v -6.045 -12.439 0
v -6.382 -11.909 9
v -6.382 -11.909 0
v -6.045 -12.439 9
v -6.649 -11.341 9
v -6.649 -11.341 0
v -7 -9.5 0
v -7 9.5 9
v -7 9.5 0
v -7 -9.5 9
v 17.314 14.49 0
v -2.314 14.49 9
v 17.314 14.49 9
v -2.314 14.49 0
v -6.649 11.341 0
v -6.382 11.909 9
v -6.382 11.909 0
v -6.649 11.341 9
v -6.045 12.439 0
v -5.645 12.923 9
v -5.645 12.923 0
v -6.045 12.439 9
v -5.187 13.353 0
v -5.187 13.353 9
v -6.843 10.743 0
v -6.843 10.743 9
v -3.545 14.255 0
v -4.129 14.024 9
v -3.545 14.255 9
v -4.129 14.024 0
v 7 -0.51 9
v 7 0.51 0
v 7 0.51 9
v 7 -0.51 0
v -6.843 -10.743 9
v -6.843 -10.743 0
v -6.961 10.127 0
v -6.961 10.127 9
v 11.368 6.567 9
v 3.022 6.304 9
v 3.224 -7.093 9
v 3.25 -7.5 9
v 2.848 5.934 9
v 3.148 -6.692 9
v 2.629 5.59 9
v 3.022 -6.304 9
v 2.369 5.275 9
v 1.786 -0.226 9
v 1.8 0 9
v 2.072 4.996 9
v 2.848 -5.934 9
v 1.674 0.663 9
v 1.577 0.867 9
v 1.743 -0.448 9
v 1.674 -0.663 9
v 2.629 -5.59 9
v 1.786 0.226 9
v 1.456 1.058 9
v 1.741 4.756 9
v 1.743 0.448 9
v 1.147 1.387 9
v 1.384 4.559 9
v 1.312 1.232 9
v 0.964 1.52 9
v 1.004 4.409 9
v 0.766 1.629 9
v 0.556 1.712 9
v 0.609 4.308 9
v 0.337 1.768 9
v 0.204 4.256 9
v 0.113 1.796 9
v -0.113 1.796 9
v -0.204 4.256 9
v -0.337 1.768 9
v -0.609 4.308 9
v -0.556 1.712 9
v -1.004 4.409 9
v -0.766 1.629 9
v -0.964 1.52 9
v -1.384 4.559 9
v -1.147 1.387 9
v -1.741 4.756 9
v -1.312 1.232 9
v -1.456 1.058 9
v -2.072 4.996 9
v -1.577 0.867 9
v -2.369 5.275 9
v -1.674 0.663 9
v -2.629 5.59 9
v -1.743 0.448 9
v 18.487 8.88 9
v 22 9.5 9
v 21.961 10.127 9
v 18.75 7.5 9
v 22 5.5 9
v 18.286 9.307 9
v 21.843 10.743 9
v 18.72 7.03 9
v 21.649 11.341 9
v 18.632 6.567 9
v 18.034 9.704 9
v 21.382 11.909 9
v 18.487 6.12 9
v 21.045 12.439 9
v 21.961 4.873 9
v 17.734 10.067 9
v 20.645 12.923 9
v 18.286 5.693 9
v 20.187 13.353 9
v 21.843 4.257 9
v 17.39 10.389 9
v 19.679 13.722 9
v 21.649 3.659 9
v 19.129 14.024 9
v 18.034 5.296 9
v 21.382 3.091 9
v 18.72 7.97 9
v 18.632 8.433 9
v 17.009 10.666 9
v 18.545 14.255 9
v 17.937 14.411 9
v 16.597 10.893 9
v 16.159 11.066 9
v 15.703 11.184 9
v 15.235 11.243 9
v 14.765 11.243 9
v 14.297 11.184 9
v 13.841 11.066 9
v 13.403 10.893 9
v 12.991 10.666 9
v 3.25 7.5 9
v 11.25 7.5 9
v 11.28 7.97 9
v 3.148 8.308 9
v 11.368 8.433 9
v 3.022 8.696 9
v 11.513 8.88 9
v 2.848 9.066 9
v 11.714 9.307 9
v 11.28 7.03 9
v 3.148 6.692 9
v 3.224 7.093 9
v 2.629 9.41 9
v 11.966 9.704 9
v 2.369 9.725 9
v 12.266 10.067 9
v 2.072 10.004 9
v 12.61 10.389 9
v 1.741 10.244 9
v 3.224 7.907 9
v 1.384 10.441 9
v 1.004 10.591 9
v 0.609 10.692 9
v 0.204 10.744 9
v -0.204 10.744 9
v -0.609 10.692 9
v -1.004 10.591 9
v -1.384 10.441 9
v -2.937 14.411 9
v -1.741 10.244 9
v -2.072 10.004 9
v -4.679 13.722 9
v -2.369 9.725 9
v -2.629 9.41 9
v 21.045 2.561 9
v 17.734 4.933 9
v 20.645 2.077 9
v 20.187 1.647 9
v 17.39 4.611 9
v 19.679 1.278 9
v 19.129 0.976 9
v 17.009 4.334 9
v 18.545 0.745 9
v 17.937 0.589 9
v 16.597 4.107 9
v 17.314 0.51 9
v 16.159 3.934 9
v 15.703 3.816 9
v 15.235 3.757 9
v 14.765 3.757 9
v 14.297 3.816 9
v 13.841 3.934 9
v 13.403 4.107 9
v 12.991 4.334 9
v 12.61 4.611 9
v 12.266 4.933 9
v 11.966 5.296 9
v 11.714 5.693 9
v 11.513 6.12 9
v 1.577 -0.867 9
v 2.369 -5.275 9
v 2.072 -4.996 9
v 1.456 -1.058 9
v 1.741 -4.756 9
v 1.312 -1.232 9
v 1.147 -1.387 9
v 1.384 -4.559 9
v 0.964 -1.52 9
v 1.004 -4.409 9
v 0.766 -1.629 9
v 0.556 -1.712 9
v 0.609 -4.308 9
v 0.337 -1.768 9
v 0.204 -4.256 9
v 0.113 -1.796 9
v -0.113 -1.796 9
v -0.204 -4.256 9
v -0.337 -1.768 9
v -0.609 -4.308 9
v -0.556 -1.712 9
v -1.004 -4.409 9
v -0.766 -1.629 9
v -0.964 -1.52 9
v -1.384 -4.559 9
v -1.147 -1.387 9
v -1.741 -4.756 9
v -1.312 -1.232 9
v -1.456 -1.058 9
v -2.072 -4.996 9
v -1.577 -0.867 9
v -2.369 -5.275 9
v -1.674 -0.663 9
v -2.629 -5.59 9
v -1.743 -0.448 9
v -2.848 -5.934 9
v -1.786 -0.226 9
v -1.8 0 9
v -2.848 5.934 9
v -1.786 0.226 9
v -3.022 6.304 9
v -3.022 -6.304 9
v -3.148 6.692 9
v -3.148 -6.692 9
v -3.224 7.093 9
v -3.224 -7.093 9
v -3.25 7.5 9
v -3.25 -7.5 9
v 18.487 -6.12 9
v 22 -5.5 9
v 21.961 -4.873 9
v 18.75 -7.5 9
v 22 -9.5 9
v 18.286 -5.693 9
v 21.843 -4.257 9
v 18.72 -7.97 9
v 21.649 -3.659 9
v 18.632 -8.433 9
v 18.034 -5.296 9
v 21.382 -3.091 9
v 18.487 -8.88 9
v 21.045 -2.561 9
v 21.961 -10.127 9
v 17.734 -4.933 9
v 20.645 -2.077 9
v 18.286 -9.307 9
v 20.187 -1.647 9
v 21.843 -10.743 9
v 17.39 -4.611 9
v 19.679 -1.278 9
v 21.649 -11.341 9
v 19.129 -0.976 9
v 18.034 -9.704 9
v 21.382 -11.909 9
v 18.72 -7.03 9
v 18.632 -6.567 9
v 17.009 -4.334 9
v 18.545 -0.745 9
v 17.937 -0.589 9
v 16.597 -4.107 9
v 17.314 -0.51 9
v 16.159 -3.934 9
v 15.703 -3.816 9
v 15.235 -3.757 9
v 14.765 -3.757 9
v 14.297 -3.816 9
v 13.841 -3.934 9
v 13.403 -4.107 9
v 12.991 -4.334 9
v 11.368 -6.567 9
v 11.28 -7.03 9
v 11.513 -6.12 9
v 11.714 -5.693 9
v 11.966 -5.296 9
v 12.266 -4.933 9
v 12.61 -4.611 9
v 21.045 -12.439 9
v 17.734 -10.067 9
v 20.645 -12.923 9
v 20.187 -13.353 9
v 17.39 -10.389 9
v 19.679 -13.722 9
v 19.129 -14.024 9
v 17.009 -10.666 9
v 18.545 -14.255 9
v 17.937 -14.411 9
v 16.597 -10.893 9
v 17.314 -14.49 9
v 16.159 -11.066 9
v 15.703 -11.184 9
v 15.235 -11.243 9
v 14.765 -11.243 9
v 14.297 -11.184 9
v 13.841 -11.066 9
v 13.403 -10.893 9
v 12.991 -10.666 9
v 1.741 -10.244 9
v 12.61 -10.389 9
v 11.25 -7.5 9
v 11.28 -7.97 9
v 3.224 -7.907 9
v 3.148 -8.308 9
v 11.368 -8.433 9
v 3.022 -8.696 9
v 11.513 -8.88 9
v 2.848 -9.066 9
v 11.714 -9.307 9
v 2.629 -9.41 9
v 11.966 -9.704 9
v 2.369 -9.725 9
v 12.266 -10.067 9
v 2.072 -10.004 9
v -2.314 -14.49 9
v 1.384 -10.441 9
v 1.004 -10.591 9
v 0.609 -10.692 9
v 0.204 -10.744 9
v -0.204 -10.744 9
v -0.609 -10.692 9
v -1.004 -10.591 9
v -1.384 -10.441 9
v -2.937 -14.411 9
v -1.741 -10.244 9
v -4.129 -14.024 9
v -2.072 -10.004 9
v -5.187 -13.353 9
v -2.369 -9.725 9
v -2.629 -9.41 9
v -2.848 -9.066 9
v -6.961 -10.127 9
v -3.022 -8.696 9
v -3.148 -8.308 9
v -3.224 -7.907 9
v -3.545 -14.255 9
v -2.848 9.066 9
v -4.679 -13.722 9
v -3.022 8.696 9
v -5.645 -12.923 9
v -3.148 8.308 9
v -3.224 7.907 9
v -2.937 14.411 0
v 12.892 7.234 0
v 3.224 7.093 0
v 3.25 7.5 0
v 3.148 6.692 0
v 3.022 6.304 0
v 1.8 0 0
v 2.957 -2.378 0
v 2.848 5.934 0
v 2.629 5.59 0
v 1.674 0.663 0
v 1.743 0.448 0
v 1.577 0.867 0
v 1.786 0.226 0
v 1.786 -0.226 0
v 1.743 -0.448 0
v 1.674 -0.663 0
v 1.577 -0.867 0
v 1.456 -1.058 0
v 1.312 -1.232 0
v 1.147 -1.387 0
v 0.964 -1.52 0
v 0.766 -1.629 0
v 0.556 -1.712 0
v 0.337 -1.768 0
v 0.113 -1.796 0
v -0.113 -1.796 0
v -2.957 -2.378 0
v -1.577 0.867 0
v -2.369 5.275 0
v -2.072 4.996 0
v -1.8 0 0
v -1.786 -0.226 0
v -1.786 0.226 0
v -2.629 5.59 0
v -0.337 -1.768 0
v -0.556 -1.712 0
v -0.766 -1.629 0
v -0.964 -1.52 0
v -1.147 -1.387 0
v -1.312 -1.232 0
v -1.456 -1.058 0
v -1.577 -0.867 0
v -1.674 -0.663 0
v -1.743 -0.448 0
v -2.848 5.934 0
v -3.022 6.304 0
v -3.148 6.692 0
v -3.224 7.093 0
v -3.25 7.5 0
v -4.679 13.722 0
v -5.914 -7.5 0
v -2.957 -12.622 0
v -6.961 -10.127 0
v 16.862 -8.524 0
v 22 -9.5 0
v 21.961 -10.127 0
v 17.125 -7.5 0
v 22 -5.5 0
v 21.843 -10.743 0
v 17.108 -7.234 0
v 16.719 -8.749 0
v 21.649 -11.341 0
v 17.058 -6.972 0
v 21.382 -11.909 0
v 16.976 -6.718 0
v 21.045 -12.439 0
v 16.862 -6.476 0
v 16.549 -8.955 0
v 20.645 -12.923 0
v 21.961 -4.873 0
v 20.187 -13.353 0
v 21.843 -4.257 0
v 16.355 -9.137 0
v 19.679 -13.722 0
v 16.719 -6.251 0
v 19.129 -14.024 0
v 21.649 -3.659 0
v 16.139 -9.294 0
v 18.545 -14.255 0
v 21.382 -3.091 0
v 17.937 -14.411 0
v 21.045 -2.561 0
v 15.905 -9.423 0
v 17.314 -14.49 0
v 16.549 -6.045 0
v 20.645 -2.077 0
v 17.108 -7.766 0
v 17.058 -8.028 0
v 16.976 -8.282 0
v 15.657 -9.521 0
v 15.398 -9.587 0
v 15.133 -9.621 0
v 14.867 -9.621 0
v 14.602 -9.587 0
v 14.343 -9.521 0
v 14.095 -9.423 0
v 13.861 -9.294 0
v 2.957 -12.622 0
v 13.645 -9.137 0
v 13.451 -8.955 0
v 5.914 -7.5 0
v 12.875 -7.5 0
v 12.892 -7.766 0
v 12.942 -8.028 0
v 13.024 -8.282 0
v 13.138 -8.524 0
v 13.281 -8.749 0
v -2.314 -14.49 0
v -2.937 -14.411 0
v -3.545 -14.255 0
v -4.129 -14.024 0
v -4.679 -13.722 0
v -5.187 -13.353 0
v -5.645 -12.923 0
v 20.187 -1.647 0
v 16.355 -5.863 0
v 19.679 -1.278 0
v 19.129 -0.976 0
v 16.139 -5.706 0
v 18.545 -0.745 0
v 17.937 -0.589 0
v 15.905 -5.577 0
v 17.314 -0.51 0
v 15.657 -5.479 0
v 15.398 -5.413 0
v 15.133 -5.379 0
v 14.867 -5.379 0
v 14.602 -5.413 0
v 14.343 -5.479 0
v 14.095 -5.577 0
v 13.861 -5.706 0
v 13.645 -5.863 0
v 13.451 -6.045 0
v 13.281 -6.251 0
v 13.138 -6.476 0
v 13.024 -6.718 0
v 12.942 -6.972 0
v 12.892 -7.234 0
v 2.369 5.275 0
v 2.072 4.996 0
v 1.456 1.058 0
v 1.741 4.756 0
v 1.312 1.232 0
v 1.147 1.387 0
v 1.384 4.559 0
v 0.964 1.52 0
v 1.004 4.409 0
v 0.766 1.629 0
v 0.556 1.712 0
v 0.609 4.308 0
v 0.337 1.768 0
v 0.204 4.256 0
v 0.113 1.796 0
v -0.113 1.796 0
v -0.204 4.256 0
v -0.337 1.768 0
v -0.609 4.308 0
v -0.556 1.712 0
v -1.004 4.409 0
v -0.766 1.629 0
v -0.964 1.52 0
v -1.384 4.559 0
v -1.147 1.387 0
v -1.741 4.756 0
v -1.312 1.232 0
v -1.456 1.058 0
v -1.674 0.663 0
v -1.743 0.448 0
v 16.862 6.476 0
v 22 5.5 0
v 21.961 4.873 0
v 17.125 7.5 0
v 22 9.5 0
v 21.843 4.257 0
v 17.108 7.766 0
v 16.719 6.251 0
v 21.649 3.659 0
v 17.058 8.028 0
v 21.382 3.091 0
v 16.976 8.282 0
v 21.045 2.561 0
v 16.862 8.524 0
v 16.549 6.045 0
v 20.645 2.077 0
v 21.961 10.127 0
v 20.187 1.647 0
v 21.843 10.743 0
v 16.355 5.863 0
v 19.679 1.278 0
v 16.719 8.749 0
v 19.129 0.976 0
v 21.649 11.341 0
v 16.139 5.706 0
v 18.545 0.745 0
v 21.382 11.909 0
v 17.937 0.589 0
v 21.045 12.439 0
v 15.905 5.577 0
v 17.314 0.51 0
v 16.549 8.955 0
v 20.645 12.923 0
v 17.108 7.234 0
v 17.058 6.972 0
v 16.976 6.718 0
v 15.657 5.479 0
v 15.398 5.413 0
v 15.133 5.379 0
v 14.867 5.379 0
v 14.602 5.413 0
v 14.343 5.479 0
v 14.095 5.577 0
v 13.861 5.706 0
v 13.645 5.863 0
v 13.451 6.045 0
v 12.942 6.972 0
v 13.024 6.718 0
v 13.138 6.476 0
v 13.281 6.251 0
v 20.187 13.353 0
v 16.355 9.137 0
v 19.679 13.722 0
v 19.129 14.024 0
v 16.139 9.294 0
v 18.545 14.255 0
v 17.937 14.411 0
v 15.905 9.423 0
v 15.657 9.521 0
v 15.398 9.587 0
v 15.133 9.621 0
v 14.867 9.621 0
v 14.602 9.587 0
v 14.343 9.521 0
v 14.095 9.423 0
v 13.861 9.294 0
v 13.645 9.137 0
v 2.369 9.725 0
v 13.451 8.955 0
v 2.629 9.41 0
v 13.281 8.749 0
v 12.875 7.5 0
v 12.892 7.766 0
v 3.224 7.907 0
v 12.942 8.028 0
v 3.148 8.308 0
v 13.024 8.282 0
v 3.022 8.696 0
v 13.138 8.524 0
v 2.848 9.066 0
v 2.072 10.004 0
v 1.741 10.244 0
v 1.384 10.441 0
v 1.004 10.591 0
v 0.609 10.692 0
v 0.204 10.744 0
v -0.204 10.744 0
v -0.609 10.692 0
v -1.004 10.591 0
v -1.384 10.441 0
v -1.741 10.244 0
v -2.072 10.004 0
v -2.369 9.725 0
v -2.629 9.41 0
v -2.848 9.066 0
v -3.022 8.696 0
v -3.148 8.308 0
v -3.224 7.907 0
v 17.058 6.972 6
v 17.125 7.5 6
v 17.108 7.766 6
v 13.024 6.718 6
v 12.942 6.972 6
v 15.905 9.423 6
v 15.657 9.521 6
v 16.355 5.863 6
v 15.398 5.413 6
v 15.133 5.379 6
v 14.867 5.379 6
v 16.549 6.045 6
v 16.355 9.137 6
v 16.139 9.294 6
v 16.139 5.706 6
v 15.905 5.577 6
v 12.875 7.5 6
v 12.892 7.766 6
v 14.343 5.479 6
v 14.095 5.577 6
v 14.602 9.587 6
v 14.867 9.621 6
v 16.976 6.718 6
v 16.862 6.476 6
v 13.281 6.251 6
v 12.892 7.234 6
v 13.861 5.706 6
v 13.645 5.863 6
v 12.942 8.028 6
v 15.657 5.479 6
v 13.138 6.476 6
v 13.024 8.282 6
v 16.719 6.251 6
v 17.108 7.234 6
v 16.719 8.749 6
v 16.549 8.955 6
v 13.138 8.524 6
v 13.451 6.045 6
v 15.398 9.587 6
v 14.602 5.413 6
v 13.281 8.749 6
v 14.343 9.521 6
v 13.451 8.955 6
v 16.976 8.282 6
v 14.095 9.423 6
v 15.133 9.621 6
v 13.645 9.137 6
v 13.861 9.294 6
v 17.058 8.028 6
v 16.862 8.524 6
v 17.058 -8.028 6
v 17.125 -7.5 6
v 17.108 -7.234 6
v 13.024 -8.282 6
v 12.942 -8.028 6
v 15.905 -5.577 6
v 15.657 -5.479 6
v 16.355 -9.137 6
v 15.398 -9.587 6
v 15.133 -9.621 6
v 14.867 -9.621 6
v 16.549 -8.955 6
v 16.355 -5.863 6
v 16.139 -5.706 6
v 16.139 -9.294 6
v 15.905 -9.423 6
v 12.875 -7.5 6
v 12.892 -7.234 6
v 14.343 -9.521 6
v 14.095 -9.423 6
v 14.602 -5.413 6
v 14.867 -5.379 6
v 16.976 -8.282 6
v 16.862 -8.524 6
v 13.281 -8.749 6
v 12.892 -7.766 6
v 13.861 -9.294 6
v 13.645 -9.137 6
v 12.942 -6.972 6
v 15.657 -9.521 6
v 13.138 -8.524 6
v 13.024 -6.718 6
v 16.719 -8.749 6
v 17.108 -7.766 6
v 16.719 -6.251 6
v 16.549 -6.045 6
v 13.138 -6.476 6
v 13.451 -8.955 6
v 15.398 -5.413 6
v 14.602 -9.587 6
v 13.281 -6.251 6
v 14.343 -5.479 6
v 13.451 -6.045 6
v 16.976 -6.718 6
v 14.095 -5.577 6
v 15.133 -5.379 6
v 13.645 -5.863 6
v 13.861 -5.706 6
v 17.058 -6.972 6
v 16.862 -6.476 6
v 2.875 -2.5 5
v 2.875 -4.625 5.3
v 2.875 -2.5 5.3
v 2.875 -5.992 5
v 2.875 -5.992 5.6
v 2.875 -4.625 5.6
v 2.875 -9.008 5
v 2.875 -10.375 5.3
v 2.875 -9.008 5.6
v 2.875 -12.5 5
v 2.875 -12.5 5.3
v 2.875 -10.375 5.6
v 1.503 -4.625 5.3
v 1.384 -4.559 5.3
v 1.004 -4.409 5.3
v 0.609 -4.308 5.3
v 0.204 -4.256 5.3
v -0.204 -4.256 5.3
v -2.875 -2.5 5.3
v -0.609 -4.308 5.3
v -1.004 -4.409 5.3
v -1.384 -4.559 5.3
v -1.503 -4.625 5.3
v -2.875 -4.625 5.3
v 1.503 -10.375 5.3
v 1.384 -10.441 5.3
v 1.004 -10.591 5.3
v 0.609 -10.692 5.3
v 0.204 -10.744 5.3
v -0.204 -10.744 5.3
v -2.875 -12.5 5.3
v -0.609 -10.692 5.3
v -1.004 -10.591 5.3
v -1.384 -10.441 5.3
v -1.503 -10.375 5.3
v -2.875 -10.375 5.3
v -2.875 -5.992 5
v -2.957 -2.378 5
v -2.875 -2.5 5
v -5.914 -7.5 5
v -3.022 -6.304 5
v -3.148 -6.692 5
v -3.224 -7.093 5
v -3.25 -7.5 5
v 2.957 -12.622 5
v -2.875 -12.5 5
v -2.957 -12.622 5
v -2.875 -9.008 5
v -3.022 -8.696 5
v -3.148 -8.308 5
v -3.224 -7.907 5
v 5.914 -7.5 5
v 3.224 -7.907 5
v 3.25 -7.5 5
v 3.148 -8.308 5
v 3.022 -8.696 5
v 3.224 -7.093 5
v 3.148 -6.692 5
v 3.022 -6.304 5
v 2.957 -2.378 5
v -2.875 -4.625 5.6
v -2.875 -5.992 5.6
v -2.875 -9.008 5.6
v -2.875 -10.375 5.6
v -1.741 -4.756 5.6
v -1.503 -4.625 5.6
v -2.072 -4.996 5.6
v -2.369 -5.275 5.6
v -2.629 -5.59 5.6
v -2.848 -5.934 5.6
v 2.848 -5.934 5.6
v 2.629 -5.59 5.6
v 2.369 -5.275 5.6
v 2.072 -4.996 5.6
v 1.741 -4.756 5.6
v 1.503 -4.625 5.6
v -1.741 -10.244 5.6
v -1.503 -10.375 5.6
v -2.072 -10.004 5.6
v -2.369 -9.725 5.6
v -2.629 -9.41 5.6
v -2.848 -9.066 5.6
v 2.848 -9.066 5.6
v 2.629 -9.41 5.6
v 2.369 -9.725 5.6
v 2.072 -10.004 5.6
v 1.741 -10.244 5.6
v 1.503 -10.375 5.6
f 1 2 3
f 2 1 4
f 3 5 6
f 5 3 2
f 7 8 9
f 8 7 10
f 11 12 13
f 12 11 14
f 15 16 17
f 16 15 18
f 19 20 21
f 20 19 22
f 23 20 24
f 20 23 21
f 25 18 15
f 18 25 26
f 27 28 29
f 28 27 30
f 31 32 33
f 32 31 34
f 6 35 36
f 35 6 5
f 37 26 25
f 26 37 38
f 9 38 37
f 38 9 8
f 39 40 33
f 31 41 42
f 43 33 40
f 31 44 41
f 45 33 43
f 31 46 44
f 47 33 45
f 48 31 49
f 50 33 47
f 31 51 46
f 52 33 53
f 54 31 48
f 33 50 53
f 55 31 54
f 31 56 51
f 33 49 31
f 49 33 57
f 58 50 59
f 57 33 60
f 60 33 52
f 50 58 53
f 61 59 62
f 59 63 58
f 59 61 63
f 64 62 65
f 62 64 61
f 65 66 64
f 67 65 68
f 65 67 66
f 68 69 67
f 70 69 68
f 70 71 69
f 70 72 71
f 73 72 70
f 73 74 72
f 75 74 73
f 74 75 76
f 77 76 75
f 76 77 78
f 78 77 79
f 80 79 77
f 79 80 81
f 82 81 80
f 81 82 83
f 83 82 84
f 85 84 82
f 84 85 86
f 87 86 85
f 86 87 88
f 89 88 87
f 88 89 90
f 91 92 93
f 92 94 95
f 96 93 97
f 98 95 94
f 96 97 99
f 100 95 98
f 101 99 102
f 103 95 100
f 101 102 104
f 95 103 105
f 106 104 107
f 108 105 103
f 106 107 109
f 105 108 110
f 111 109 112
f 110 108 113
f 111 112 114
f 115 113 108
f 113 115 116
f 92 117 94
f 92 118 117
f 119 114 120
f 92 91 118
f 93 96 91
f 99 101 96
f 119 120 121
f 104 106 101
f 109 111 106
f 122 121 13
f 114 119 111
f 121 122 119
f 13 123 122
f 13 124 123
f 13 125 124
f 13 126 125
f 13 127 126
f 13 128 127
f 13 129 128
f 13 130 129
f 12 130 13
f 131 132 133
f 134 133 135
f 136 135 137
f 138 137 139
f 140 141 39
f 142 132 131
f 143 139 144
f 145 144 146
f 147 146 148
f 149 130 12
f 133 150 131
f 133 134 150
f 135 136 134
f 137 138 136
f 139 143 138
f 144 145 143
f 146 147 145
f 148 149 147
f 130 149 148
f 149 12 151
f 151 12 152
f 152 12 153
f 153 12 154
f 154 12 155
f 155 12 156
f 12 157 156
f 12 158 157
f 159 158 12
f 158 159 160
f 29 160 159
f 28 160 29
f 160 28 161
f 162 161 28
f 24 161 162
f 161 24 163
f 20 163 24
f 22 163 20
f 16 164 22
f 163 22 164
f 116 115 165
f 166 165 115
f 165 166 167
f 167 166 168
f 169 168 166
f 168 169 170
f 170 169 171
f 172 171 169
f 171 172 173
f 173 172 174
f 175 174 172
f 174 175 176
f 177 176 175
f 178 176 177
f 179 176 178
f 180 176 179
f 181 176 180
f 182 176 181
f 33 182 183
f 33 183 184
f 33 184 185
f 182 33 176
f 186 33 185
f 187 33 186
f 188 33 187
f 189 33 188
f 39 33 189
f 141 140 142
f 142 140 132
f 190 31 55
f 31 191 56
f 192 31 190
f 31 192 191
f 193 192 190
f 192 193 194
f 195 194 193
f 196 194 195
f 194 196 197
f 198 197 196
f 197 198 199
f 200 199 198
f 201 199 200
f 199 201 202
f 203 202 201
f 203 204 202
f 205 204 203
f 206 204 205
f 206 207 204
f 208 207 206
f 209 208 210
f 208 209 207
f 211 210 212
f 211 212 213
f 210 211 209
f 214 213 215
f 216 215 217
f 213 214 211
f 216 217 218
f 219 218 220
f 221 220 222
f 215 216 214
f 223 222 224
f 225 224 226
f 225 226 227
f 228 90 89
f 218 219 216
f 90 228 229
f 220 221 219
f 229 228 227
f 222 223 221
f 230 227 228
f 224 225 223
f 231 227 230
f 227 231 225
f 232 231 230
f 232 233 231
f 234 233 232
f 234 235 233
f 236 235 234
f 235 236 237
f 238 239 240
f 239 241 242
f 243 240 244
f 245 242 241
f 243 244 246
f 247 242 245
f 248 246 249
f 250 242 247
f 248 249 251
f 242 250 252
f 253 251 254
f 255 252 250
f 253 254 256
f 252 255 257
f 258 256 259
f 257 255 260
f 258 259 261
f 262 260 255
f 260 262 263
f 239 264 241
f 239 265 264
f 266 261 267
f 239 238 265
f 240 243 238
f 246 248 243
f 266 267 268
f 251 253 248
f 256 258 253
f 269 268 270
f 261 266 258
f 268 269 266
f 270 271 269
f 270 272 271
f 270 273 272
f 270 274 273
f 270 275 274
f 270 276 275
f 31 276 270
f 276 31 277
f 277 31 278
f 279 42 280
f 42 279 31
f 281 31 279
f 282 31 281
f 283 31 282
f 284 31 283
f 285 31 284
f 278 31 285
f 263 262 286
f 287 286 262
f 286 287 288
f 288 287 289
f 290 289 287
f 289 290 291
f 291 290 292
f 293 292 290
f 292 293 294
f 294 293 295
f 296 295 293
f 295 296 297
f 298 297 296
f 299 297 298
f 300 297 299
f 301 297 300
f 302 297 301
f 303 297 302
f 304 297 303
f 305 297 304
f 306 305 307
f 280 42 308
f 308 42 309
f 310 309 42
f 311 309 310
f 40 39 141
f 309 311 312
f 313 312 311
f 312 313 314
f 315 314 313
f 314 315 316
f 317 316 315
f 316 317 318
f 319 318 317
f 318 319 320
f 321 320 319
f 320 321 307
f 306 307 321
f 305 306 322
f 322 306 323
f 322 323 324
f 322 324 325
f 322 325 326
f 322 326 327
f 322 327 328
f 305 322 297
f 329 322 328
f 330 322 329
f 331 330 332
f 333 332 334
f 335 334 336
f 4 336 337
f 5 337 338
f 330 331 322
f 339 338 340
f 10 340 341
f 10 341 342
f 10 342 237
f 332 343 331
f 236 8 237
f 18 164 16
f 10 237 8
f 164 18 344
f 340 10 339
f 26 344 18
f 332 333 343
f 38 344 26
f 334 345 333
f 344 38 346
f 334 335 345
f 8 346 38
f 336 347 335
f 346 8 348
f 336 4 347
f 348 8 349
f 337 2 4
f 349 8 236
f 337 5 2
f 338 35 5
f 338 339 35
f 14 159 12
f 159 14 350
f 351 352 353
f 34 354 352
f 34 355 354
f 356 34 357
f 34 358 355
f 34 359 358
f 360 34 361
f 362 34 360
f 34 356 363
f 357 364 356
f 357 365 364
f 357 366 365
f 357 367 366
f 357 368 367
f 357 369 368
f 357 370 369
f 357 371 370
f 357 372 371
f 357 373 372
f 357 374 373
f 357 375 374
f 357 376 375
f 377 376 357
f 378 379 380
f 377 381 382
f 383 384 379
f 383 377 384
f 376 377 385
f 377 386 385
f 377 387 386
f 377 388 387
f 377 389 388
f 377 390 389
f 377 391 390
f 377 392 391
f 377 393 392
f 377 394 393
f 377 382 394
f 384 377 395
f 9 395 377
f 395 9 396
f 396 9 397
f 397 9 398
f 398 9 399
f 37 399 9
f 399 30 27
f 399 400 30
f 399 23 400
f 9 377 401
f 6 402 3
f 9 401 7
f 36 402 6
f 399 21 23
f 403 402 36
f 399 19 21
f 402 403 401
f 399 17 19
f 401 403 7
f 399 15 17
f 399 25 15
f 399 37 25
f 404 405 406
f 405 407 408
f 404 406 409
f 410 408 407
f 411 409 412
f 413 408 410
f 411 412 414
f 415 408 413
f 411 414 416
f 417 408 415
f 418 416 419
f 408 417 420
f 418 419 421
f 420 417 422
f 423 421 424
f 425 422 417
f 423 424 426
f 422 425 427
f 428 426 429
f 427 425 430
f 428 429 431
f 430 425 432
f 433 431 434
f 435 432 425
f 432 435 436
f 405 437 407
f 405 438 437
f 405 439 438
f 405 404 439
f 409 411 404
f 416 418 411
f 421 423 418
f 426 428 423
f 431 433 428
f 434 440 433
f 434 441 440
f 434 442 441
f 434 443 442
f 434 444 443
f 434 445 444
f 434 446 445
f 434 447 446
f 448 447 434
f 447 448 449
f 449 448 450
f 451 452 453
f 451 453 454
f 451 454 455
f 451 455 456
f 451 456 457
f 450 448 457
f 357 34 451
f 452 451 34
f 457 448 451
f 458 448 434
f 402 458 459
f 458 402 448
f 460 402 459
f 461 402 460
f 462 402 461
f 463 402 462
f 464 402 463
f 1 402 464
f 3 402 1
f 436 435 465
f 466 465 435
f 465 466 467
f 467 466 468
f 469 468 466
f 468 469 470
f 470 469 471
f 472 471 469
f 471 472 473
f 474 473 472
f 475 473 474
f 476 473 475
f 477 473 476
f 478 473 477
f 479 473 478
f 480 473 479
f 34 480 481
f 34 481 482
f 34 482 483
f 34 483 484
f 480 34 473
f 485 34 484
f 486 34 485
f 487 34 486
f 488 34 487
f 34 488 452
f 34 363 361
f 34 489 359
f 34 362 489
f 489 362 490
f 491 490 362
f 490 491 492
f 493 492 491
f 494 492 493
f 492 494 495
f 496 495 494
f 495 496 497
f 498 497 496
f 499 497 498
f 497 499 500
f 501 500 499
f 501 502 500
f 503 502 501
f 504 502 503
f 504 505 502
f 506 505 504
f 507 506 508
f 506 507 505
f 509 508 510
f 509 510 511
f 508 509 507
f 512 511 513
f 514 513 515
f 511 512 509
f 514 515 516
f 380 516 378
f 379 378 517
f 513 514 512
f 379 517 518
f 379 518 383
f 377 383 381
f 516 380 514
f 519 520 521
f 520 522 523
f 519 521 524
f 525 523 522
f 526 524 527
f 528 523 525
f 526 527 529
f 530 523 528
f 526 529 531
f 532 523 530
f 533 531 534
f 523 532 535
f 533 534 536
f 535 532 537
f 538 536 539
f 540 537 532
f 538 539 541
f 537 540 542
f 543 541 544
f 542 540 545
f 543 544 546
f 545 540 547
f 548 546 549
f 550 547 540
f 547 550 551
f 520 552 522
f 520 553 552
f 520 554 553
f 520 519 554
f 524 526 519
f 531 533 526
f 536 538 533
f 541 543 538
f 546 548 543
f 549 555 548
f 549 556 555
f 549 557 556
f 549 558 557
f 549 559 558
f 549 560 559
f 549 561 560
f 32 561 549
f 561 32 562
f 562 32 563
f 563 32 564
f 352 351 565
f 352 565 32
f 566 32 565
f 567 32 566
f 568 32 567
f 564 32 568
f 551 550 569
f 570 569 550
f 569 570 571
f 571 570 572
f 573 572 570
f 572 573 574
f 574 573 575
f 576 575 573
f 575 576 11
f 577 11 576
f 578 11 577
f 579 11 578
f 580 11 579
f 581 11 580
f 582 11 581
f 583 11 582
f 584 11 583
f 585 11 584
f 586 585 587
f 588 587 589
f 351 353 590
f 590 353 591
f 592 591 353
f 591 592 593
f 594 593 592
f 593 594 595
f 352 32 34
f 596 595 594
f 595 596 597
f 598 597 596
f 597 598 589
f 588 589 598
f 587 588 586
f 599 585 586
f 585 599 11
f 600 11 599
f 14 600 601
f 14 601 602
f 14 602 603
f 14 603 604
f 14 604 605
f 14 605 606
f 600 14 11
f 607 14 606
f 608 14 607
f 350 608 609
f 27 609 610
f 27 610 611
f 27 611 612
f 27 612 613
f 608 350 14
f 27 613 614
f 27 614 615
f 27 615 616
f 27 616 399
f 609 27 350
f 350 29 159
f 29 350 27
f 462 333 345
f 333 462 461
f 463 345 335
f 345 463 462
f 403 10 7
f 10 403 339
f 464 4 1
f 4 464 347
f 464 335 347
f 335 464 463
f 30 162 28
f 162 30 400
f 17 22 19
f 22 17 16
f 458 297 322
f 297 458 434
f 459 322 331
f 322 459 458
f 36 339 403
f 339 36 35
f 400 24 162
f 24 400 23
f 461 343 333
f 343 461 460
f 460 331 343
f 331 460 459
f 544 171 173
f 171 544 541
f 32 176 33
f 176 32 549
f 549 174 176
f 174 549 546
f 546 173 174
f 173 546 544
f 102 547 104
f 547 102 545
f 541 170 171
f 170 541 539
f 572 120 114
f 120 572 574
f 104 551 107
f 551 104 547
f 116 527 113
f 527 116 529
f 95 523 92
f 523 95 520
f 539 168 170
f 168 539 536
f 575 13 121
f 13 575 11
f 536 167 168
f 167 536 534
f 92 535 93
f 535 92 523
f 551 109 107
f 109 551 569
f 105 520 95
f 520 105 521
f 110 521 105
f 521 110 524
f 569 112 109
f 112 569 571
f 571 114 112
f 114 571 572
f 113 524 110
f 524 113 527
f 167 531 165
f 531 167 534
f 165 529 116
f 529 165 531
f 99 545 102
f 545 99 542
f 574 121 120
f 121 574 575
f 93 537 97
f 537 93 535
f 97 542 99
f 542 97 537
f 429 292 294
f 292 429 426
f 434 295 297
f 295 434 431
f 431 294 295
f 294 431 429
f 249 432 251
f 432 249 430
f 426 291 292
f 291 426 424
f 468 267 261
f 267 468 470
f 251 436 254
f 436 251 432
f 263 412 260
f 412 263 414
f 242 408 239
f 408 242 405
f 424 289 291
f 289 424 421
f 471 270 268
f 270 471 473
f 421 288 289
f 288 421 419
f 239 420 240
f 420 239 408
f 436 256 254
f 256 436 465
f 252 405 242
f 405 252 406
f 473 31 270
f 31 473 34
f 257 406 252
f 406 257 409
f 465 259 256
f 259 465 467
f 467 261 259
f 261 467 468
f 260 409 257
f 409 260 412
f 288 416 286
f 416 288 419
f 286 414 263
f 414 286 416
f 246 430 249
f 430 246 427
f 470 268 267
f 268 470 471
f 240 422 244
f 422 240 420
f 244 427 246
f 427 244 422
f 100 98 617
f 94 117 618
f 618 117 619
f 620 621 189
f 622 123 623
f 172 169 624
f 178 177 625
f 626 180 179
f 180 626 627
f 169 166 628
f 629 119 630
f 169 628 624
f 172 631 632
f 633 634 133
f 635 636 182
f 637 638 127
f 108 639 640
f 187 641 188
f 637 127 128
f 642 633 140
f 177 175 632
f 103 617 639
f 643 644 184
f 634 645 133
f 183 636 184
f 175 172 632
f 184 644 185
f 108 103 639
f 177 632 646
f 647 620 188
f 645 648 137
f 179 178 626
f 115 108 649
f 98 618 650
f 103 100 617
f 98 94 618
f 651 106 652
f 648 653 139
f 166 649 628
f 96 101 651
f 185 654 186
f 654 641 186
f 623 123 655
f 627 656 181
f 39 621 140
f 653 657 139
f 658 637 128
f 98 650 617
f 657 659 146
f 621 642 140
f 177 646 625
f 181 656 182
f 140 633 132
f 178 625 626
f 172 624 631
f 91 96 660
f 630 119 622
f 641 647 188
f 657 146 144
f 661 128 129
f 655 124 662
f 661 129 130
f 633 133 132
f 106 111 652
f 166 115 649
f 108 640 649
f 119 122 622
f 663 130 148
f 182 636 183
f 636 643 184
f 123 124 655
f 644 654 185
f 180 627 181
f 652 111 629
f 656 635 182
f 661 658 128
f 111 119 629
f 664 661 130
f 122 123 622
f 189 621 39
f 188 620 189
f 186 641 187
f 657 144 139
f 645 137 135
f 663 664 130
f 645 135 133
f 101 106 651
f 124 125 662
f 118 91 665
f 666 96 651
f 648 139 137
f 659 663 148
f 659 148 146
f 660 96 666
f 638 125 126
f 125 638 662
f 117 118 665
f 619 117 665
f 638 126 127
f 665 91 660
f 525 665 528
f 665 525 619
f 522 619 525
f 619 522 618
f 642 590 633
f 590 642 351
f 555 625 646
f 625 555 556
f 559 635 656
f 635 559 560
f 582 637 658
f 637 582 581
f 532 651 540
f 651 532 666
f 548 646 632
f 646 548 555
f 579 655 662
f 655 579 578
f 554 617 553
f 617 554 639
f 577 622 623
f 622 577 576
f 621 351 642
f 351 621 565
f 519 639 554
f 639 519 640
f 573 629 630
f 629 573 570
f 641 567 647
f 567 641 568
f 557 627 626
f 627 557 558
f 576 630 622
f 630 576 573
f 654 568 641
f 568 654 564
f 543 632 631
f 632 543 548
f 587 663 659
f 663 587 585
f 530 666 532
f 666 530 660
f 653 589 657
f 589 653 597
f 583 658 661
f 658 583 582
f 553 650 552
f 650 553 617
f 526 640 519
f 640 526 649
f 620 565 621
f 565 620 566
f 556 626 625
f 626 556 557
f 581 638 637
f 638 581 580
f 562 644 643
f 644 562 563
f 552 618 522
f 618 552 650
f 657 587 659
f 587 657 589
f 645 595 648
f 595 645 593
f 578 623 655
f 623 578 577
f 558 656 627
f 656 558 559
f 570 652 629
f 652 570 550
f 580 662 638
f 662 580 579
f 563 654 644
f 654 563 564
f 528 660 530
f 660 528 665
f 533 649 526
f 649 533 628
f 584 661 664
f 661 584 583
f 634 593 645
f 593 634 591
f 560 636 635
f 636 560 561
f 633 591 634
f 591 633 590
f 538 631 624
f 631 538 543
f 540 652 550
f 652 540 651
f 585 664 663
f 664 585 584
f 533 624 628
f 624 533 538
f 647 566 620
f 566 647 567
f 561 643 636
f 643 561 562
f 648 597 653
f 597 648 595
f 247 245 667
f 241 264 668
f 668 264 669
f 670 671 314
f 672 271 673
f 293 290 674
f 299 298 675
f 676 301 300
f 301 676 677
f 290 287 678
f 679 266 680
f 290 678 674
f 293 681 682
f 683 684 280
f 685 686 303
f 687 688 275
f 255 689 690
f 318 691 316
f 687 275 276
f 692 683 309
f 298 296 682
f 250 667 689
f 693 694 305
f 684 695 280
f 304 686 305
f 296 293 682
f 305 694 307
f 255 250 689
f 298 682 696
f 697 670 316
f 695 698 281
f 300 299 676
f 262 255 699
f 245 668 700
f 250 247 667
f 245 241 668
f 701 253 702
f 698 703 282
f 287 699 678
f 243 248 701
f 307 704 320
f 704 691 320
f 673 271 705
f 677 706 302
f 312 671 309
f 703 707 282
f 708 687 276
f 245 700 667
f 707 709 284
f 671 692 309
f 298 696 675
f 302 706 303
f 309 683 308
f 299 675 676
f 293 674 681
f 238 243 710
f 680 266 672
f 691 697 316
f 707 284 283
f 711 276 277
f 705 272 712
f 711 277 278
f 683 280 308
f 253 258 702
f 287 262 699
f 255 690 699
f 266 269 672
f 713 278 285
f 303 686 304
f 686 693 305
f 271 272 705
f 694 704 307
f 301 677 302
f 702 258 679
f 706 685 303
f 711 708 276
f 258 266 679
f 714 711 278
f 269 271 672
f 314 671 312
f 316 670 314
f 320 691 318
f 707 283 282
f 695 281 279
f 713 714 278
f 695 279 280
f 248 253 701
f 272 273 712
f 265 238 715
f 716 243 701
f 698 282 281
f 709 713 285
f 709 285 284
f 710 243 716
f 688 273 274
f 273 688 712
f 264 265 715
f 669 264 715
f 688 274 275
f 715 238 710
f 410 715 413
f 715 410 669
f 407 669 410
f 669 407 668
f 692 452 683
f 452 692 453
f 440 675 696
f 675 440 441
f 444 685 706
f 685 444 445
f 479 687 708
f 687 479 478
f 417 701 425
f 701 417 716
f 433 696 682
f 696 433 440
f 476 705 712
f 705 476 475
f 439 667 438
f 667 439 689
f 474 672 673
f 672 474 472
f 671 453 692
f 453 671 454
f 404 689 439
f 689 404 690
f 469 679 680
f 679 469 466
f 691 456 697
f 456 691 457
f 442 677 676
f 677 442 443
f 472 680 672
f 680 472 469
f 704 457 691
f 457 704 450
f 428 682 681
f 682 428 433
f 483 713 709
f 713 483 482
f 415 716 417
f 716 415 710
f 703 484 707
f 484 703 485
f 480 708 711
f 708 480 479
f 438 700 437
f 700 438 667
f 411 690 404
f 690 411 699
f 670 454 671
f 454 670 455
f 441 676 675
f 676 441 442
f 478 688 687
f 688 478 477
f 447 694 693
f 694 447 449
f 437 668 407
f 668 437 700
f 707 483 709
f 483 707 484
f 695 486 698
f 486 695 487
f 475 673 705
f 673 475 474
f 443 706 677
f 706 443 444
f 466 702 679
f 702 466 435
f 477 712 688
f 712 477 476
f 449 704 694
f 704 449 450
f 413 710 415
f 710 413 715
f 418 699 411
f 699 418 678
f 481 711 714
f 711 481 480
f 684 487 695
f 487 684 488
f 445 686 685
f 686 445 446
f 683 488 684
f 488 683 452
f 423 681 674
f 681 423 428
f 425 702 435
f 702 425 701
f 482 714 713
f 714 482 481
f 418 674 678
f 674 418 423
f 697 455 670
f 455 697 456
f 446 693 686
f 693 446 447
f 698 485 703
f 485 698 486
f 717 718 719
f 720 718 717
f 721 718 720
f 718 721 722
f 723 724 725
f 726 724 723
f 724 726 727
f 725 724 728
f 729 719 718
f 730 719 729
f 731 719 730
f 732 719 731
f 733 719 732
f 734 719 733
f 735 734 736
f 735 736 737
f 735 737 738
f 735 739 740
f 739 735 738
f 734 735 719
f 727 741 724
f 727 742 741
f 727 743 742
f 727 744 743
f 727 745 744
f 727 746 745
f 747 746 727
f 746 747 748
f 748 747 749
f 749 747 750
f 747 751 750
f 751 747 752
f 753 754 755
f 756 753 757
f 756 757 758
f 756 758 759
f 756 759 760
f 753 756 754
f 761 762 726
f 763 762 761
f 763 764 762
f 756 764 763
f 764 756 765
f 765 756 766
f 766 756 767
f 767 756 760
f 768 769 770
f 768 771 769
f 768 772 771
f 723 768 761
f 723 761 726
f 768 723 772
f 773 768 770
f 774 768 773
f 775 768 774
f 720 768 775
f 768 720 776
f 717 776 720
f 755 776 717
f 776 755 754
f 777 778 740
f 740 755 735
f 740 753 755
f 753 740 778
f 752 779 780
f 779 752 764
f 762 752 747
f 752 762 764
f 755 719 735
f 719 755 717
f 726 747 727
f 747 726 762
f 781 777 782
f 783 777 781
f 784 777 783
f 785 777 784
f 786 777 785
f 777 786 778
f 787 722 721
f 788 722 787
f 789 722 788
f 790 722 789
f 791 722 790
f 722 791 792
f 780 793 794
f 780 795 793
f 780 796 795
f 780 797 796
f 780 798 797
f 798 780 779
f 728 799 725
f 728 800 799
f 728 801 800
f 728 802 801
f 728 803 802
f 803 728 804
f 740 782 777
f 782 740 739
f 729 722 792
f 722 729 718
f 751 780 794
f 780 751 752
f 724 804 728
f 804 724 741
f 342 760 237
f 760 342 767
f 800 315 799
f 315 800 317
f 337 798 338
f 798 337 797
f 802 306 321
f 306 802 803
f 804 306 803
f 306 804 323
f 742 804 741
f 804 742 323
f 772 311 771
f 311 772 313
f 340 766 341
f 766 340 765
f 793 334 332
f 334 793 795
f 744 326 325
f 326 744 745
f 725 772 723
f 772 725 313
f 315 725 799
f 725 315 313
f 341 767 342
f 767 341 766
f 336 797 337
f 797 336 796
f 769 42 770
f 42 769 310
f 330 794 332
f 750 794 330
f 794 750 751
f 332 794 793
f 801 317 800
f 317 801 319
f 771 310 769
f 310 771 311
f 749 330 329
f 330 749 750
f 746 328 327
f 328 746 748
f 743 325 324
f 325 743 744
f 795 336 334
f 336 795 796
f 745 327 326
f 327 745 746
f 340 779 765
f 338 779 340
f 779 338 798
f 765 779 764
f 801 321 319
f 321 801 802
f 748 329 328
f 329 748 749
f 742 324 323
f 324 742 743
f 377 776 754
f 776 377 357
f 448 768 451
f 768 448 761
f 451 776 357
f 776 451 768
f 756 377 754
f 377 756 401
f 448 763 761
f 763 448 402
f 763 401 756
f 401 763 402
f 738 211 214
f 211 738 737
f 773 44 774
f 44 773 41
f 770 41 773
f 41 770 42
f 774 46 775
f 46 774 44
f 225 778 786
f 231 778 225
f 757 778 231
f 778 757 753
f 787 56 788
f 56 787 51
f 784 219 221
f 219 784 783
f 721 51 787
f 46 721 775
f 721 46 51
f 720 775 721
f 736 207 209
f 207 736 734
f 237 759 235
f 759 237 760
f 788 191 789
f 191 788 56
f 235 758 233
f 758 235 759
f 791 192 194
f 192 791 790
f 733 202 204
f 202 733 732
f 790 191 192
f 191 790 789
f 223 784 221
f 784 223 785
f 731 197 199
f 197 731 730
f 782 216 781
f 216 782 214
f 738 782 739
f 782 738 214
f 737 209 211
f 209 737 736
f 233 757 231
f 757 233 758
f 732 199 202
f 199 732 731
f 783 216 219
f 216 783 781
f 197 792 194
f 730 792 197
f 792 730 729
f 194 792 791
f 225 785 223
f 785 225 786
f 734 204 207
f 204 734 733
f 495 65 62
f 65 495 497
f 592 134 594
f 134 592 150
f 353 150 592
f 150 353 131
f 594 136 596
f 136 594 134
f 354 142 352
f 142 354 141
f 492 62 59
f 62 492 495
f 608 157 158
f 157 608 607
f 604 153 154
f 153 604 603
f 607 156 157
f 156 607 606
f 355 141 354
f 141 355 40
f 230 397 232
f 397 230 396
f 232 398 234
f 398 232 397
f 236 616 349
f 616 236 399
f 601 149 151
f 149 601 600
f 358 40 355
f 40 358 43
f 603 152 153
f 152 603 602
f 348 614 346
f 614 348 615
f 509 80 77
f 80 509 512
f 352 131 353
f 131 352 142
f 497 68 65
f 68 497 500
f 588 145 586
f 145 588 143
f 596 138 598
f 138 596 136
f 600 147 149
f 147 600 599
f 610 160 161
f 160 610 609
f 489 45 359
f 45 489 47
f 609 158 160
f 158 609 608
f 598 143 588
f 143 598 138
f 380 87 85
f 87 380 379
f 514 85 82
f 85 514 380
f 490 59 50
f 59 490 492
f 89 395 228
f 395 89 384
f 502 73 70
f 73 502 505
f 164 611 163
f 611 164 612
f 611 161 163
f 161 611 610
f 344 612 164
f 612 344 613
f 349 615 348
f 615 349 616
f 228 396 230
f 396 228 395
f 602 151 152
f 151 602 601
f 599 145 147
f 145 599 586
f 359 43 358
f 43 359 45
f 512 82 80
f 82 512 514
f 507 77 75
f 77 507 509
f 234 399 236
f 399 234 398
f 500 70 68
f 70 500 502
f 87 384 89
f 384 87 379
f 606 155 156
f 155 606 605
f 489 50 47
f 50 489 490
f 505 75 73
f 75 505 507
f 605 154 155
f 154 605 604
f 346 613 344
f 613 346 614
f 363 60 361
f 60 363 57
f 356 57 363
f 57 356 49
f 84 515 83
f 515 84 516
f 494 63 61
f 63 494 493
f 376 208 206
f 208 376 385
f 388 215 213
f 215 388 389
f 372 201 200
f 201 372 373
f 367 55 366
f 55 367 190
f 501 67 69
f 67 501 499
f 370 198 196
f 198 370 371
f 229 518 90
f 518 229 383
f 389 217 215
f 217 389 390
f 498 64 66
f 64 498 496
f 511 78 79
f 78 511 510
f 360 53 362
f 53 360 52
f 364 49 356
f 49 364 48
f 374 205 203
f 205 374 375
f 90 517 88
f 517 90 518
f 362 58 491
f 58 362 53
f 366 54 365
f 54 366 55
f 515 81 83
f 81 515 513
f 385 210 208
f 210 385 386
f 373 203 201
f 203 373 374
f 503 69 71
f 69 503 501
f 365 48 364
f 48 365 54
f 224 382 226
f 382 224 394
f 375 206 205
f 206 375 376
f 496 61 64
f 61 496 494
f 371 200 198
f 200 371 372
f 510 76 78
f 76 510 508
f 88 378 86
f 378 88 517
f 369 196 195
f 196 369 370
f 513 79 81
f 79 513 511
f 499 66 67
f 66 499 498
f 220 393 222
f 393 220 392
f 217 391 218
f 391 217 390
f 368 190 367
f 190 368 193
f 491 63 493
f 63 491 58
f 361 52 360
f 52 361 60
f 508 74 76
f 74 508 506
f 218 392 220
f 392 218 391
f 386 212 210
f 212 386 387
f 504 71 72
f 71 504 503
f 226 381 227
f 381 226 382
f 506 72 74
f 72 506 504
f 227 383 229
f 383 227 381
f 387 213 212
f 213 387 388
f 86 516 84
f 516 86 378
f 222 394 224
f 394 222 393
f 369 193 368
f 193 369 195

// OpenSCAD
$fn = 50;


difference() {
	union() {
		hull() {
			translate(v = [-2.0000000000, 9.5000000000, 0]) {
				cylinder(h = 9, r = 5);
			}
			translate(v = [2.0000000000, 9.5000000000, 0]) {
				cylinder(h = 9, r = 5);
			}
			translate(v = [-2.0000000000, -9.5000000000, 0]) {
				cylinder(h = 9, r = 5);
			}
			translate(v = [2.0000000000, -9.5000000000, 0]) {
				cylinder(h = 9, r = 5);
			}
		}
		translate(v = [7.5000000000, 7.5000000000, 0]) {
			hull() {
				translate(v = [-9.5000000000, 2.0000000000, 0]) {
					cylinder(h = 9, r = 5);
				}
				translate(v = [9.5000000000, 2.0000000000, 0]) {
					cylinder(h = 9, r = 5);
				}
				translate(v = [-9.5000000000, -2.0000000000, 0]) {
					cylinder(h = 9, r = 5);
				}
				translate(v = [9.5000000000, -2.0000000000, 0]) {
					cylinder(h = 9, r = 5);
				}
			}
		}
		translate(v = [7.5000000000, -7.5000000000, 0]) {
			hull() {
				translate(v = [-9.5000000000, 2.0000000000, 0]) {
					cylinder(h = 9, r = 5);
				}
				translate(v = [9.5000000000, 2.0000000000, 0]) {
					cylinder(h = 9, r = 5);
				}
				translate(v = [-9.5000000000, -2.0000000000, 0]) {
					cylinder(h = 9, r = 5);
				}
				translate(v = [9.5000000000, -2.0000000000, 0]) {
					cylinder(h = 9, r = 5);
				}
			}
		}
	}
	union() {
		translate(v = [15.0000000000, 7.5000000000, 9]) {
			rotate(a = [0, 0, 0]) {
				difference() {
					union() {
						#translate(v = [0, 0, -9.0000000000]) {
							cylinder(h = 9, r = 2.0000000000);
						}
						#translate(v = [0, 0, -3]) {
							cylinder(h = 3, r1 = 2.1250000000, r2 = 3.7500000000);
						}
						#translate(v = [0, 0, -9.0000000000]) {
							cylinder(h = 9, r = 2.1250000000);
						}
						#translate(v = [0, 0, -9.0000000000]) {
							cylinder(h = 9, r = 2.0000000000);
						}
					}
					union();
				}
			}
		}
		translate(v = [15.0000000000, -7.5000000000, 9]) {
			rotate(a = [0, 0, 0]) {
				difference() {
					union() {
						#translate(v = [0, 0, -9.0000000000]) {
							cylinder(h = 9, r = 2.0000000000);
						}
						#translate(v = [0, 0, -3]) {
							cylinder(h = 3, r1 = 2.1250000000, r2 = 3.7500000000);
						}
						#translate(v = [0, 0, -9.0000000000]) {
							cylinder(h = 9, r = 2.1250000000);
						}
						#translate(v = [0, 0, -9.0000000000]) {
							cylinder(h = 9, r = 2.0000000000);
						}
					}
					union();
				}
			}
		}
		translate(v = [0.0000000000, -7.5000000000, 0]) {
			rotate(a = [0, 0, 0]) {
				difference() {
					union() {
						#translate(v = [-2.8750000000, -5.0000000000, -0.3000000000]) {
							cube(size = [5.7500000000, 10, 0.3000000000]);
						}
						#translate(v = [-2.8750000000, -2.8750000000, -0.6000000000]) {
							cube(size = [5.7500000000, 5.7500000000, 0.3000000000]);
						}
						#translate(v = [-2.8750000000, -5.0000000000, 5]) {
							cube(size = [5.7500000000, 10, 0.3000000000]);
						}
						#translate(v = [-2.8750000000, -2.8750000000, 5.3000000000]) {
							cube(size = [5.7500000000, 5.7500000000, 0.3000000000]);
						}
						#translate(v = [0, 0, -100.0000000000]) {
							cylinder(h = 200, r = 3.2500000000);
						}
						#linear_extrude(height = 5) {
							polygon(points = [[5.9142500000, 0.0000000000], [2.9571250000, 5.1218907443], [-2.9571250000, 5.1218907443], [-5.9142500000, 0.0000000000], [-2.9571250000, -5.1218907443], [2.9571250000, -5.1218907443]]);
						}
						#translate(v = [-2.8750000000, -5.0000000000, -0.3000000000]) {
							cube(size = [5.7500000000, 10, 0.3000000000]);
						}
						#translate(v = [-2.8750000000, -2.8750000000, -0.6000000000]) {
							cube(size = [5.7500000000, 5.7500000000, 0.3000000000]);
						}
						#translate(v = [-2.8750000000, -5.0000000000, 5]) {
							cube(size = [5.7500000000, 10, 0.3000000000]);
						}
						#translate(v = [-2.8750000000, -2.8750000000, 5.3000000000]) {
							cube(size = [5.7500000000, 5.7500000000, 0.3000000000]);
						}
						#translate(v = [0, 0, -100.0000000000]) {
							cylinder(h = 200, r = 3.2500000000);
						}
						#translate(v = [-2.8750000000, -5.0000000000, -0.3000000000]) {
							cube(size = [5.7500000000, 10, 0.3000000000]);
						}
						#translate(v = [-2.8750000000, -2.8750000000, -0.6000000000]) {
							cube(size = [5.7500000000, 5.7500000000, 0.3000000000]);
						}
						#translate(v = [-2.8750000000, -5.0000000000, 5]) {
							cube(size = [5.7500000000, 10, 0.3000000000]);
						}
						#translate(v = [-2.8750000000, -2.8750000000, 5.3000000000]) {
							cube(size = [5.7500000000, 5.7500000000, 0.3000000000]);
						}
						#translate(v = [0, 0, -100.0000000000]) {
							cylinder(h = 200, r = 3.2500000000);
						}
					}
					union();
				}
			}
		}
		translate(v = [0.0000000000, -7.5000000000, 0]) {
			translate(v = [0, 0, -100]) {
				cylinder(h = 200, r = 3.2500000000);
			}
		}
		translate(v = [0.0000000000, 7.5000000000, 0]) {
			translate(v = [0, 0, -100]) {
				cylinder(h = 200, r = 3.2500000000);
			}
		}
		translate(v = [0.0000000000, -7.5000000000, 0]) {
			translate(v = [0, 0, -100]) {
				cylinder(h = 200, r = 1.8000000000);
			}
		}
		translate(v = [0, 0, -100]) {
			cylinder(h = 200, r = 1.8000000000);
		}
		translate(v = [0.0000000000, 7.5000000000, 0]) {
			translate(v = [0, 0, -100]) {
				cylinder(h = 200, r = 1.8000000000);
			}
		}
	}
}
